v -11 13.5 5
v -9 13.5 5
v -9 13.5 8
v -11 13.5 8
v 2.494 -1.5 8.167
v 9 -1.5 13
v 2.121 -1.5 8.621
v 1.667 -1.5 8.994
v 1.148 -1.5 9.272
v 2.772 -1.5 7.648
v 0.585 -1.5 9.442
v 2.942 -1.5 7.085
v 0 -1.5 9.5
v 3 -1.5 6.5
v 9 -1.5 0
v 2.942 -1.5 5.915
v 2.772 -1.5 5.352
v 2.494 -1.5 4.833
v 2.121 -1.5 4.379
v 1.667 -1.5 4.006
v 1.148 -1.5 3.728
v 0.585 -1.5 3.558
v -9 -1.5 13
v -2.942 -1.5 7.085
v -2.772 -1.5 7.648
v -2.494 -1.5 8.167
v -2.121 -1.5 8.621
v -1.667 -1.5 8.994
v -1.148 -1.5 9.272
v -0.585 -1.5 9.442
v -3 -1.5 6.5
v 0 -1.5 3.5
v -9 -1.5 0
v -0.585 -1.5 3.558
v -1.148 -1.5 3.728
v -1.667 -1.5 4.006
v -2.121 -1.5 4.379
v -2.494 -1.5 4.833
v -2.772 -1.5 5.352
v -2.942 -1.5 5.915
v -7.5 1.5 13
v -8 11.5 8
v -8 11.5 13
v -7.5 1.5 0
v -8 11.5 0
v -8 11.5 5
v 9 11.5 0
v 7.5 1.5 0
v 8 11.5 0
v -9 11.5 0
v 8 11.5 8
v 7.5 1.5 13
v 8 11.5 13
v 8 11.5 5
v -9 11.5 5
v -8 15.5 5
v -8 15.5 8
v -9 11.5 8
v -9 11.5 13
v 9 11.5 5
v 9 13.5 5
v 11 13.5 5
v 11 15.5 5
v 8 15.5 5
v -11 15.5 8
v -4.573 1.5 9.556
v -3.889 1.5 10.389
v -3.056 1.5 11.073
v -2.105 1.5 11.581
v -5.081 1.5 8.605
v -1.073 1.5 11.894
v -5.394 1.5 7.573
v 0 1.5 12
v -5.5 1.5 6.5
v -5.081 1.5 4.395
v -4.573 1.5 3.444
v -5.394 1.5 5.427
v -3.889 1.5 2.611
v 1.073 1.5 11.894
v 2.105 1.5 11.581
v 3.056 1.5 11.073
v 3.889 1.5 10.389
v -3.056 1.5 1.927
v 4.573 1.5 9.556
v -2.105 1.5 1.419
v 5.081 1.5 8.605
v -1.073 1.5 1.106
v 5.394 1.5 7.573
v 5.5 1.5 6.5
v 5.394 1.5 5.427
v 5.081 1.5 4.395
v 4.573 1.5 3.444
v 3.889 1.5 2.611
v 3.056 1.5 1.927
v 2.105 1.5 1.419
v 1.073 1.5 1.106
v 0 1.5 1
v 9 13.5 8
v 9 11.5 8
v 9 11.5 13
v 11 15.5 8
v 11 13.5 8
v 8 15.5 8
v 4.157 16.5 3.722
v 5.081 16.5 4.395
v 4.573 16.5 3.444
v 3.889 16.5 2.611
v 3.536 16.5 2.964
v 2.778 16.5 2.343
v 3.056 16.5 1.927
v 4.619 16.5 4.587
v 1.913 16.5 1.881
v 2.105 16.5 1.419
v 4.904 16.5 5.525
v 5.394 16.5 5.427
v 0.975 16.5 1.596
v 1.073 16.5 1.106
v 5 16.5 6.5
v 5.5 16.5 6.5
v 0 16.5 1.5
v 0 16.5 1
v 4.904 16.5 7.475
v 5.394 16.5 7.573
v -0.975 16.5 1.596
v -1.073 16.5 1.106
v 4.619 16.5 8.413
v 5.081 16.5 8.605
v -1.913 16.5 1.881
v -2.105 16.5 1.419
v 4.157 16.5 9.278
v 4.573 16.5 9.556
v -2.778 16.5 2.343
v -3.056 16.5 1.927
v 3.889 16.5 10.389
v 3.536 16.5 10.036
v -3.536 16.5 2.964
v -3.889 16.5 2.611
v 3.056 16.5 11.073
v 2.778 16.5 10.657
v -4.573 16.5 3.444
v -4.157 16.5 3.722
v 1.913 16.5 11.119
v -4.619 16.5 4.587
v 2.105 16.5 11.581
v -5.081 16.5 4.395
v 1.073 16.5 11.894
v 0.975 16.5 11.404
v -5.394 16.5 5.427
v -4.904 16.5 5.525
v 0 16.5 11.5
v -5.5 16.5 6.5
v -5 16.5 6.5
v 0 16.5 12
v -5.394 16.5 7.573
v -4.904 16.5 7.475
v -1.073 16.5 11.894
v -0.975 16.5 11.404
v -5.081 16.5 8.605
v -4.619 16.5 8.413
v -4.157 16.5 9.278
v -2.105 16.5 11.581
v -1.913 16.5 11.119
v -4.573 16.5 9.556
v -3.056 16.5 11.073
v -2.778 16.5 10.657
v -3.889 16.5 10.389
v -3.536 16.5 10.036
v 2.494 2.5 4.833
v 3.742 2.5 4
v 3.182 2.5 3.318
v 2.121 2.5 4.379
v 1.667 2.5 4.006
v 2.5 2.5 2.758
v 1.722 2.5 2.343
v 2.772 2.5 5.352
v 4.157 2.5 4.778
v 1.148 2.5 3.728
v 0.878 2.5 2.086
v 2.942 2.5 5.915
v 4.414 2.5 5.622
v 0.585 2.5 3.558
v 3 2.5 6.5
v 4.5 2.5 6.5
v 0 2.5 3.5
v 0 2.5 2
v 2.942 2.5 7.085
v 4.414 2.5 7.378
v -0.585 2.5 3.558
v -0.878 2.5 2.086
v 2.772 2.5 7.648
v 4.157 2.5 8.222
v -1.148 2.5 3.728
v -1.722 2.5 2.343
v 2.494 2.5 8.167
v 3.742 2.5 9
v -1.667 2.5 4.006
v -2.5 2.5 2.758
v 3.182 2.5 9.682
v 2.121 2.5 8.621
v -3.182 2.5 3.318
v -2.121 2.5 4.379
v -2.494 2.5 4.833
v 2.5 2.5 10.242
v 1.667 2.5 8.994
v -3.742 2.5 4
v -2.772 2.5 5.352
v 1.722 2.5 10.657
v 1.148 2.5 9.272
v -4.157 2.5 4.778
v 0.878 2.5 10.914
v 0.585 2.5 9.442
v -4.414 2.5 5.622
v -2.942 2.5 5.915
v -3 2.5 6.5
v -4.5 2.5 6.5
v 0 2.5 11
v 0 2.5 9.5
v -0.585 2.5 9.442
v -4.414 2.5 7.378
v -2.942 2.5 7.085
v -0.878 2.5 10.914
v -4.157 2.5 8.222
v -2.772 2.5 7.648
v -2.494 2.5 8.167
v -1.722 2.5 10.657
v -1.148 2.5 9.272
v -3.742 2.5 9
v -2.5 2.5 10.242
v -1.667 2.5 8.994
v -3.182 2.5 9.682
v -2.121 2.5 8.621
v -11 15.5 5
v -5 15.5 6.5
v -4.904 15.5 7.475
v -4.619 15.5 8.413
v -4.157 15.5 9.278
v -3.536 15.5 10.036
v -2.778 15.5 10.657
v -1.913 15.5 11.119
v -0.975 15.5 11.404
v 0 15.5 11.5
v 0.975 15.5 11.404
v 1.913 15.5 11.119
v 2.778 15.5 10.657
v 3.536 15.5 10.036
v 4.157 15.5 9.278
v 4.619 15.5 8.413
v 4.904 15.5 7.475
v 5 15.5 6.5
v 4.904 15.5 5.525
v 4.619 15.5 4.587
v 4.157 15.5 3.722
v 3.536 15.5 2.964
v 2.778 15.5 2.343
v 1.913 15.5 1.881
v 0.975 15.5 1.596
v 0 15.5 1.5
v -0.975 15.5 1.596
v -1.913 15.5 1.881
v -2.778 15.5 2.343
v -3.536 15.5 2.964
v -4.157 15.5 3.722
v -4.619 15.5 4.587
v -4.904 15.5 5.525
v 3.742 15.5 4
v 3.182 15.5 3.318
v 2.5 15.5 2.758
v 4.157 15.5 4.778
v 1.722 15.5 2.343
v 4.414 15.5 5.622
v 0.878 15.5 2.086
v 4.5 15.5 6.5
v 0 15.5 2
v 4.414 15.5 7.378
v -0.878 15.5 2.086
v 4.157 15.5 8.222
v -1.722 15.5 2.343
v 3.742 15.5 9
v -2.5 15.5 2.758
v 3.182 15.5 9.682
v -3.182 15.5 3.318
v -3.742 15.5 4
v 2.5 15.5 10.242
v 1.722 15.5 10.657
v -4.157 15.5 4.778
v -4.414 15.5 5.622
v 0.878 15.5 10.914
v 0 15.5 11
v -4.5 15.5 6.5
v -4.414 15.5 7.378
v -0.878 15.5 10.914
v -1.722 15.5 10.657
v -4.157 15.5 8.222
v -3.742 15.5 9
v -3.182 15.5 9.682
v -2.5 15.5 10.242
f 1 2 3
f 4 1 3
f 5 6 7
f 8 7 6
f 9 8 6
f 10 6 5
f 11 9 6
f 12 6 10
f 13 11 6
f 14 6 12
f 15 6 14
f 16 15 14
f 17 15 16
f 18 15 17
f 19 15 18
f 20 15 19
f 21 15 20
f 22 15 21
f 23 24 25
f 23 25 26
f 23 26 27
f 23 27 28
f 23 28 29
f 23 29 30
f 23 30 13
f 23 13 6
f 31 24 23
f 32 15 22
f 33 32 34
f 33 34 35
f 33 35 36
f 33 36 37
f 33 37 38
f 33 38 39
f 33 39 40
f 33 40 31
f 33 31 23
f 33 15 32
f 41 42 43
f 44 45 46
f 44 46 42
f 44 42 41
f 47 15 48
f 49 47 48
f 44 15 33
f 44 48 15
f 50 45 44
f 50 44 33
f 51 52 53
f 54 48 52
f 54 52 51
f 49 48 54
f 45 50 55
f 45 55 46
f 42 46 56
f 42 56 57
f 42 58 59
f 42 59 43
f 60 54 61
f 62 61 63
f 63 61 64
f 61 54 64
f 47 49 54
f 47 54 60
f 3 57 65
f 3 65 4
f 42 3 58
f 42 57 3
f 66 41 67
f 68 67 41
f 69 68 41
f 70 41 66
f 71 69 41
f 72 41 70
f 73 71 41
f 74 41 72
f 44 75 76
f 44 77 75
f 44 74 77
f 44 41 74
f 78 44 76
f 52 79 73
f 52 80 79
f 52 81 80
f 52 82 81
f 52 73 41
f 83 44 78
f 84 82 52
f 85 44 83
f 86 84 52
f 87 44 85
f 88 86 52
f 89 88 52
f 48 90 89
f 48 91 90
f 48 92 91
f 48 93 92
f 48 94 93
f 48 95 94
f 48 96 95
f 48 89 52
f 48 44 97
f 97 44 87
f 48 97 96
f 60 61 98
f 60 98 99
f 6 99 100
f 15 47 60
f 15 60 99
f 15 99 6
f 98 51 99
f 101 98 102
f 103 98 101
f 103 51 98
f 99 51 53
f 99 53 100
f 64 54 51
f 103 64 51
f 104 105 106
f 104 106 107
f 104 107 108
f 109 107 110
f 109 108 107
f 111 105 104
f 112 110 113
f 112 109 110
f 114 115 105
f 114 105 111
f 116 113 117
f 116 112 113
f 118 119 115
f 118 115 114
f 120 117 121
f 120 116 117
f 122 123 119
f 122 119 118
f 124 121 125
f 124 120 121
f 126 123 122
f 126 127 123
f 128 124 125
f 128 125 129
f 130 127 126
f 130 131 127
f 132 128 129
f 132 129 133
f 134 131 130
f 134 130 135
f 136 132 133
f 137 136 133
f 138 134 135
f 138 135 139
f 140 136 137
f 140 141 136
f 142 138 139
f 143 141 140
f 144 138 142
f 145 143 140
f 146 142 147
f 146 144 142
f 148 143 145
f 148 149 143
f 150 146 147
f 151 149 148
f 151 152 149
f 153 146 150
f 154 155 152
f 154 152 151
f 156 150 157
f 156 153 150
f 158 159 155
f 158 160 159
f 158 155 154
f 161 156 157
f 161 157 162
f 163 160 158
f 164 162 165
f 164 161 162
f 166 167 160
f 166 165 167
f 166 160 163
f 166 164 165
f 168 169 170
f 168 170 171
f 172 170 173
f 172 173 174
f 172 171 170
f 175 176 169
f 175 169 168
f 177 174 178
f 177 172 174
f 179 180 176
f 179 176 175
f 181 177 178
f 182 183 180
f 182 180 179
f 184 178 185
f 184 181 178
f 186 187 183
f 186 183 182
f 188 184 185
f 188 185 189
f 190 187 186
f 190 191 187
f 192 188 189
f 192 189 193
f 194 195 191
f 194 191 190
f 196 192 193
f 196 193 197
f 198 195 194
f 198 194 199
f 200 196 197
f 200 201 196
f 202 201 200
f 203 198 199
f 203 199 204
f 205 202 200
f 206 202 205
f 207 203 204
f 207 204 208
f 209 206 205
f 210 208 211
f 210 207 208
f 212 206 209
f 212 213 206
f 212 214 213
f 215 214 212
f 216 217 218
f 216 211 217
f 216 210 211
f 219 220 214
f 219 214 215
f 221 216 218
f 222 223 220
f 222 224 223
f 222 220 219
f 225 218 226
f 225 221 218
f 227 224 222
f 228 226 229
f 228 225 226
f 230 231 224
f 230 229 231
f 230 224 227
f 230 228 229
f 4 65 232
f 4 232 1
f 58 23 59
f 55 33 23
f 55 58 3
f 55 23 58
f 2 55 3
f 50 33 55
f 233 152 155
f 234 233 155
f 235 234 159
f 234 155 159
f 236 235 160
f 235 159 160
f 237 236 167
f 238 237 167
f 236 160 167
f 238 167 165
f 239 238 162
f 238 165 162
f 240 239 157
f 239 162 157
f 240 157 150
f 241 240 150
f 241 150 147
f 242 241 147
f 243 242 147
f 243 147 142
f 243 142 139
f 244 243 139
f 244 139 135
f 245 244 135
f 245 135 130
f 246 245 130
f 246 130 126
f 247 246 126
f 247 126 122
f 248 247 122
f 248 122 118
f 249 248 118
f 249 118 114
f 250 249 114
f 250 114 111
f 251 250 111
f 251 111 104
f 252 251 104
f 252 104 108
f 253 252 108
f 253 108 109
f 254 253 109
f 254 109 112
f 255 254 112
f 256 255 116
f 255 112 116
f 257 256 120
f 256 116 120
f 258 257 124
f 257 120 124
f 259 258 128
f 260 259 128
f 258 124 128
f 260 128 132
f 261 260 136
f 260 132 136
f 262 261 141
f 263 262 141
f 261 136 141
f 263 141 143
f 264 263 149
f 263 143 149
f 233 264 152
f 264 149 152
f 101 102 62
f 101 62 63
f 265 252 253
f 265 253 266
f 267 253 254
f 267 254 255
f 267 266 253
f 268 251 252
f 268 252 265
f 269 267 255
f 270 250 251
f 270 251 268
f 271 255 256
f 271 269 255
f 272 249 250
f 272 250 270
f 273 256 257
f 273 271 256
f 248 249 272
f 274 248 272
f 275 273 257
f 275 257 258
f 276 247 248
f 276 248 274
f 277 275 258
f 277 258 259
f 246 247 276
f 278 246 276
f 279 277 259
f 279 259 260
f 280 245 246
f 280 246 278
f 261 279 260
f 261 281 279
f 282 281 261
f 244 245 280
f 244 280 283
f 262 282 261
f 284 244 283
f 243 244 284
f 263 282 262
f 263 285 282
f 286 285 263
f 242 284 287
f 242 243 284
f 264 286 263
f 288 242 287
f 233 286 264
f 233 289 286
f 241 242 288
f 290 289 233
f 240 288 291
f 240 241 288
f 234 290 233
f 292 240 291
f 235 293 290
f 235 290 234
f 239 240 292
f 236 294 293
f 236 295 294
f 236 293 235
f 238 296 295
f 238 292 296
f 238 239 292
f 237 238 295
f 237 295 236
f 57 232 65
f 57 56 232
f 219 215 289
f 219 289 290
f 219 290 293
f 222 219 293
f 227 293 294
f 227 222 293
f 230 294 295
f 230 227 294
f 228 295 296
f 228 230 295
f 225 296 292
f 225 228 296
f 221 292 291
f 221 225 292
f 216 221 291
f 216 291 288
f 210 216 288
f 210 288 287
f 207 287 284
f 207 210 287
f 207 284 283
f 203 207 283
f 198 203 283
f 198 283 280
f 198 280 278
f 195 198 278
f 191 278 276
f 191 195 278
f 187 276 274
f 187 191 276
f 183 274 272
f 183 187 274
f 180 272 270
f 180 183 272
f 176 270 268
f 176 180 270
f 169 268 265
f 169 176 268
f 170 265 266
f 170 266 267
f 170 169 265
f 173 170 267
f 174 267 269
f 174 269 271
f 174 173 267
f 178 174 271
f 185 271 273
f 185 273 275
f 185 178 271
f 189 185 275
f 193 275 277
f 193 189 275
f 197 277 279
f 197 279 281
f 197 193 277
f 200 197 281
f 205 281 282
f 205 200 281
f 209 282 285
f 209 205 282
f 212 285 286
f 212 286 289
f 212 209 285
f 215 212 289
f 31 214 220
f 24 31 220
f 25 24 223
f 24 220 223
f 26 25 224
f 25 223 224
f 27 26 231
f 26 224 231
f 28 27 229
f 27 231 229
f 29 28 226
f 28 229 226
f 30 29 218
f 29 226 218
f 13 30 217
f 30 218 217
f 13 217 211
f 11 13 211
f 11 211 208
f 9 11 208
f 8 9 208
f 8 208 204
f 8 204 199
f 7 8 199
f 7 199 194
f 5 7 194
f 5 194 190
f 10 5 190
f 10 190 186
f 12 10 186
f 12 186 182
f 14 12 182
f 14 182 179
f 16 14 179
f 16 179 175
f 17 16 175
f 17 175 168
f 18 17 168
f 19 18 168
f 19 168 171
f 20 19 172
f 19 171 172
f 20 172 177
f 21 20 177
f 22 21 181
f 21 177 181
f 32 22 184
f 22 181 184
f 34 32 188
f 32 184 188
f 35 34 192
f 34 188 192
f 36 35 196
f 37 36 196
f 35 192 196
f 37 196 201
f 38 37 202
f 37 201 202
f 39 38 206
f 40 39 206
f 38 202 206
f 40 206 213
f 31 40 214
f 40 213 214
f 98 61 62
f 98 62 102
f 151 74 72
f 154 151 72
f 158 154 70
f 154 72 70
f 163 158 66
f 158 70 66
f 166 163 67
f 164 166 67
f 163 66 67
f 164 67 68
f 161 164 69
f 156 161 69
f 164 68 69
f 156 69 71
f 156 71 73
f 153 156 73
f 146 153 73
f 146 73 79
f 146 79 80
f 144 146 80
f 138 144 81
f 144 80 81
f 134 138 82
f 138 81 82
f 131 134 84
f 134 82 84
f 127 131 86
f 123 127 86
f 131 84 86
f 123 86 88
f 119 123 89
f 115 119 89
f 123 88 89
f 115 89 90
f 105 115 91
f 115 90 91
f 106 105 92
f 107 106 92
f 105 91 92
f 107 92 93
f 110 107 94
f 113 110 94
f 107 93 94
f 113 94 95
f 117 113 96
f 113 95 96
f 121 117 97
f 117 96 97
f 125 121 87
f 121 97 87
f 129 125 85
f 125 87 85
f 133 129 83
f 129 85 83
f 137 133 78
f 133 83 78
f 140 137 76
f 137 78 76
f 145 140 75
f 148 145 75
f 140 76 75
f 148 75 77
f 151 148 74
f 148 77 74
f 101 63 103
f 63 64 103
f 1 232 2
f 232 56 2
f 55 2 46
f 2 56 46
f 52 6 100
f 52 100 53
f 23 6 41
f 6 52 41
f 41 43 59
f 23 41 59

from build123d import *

# Parameters (mm, degrees)
PAD_DEPTH       = 13
SKETCH001_R     = 5.5
PAD001_DEPTH    = 15
SKETCH002_R     = 5
POCKET_DEPTH    = 14
SKETCH003_R     = 3
POCKET001_DEPTH = 4.001
SKETCH005_W     = 1
SKETCH005_H     = 3
PAD002_DEPTH    = 4
SKETCH006_W     = 1
SKETCH006_H     = 3
PAD003_DEPTH    = 4
SKETCH007_W     = 2
SKETCH007_H     = 3
PAD004_DEPTH    = 2
SKETCH008_W     = 2
SKETCH008_H     = 3
PAD005_DEPTH    = 2
SKETCH009_R     = 5
SKETCH009_R_2   = 4.5
PAD006_DEPTH    = 13


with BuildPart() as part:
    # Sketch → Pad (new body)
    with BuildSketch(Plane.XY):
        Polygon((-7.5, 1.5), (7.5, 1.5), (8, 11.5), (9, 11.5), (9, -1.5), (-9, -1.5), (-9, 11.5), (-8, 11.5), align=None)
    extrude(amount=PAD_DEPTH)

    # Sketch001 (on Face5 of Pad) → Pad001 (join)
    with BuildSketch(Plane(origin=(0, 1.5, 0), x_dir=(-1, 0, 0), z_dir=(0, 1, 0))):
        with Locations((0, 6.5)):
            Circle(SKETCH001_R)
    extrude(amount=PAD001_DEPTH)

    # Sketch002 (on Face12 of Pad001) → Pocket (cut)
    with BuildSketch(Plane(origin=(0, 16.5, 0), x_dir=(-1, 0, 0), z_dir=(0, 1, 0))):
        with Locations((0, 6.5)):
            Circle(SKETCH002_R)
    extrude(amount=-POCKET_DEPTH, mode=Mode.SUBTRACT)

    # Sketch003 (on Face14 of Pocket) → Pocket001 (cut, through all)
    with BuildSketch(Plane(origin=(0, 2.5, 0), x_dir=(-1, 0, 0), z_dir=(0, 1, 0))):
        with Locations((0, 6.5)):
            Circle(SKETCH003_R)
    extrude(amount=-POCKET001_DEPTH, mode=Mode.SUBTRACT)

    # Sketch005 (on Face8 of Pocket001) → Pad002 (join)
    with BuildSketch(Plane(origin=(0, 11.5, 0), x_dir=(-1, 0, 0), z_dir=(0, 1, 0))):
        with Locations((8.5, 6.5)):
            Rectangle(SKETCH005_W, SKETCH005_H)
    extrude(amount=PAD002_DEPTH)

    # Sketch006 (on Face7 of Pad002) → Pad003 (join)
    with BuildSketch(Plane(origin=(0, 11.5, 0), x_dir=(-1, 0, 0), z_dir=(0, 1, 0))):
        with Locations((-8.5, 6.5)):
            Rectangle(SKETCH006_W, SKETCH006_H)
    extrude(amount=PAD003_DEPTH)

    # Sketch007 (on Face15 of Pad003) → Pad004 (join)
    with BuildSketch(Plane(origin=(-9, 0, 0), x_dir=(0, -1, 0), z_dir=(-1, 0, 0))):
        with Locations((-14.5, 6.5)):
            Rectangle(SKETCH007_W, SKETCH007_H)
    extrude(amount=PAD004_DEPTH)

    # Sketch008 (on Face8 of Pad004) → Pad005 (join)
    with BuildSketch(Plane.YZ.offset(9)):
        with Locations((14.5, 6.5)):
            Rectangle(SKETCH008_W, SKETCH008_H)
    extrude(amount=PAD005_DEPTH)

    # Sketch009 (on Face16 of Pad005) → Pad006 (join)
    with BuildSketch(Plane(origin=(0, 2.5, 0), x_dir=(-1, 0, 0), z_dir=(0, 1, 0))):
        with Locations((0, 6.5)):
            Circle(SKETCH009_R)
        with Locations((0, 6.5)):
            Circle(SKETCH009_R_2, mode=Mode.SUBTRACT)
    extrude(amount=PAD006_DEPTH)


solid = part.part
